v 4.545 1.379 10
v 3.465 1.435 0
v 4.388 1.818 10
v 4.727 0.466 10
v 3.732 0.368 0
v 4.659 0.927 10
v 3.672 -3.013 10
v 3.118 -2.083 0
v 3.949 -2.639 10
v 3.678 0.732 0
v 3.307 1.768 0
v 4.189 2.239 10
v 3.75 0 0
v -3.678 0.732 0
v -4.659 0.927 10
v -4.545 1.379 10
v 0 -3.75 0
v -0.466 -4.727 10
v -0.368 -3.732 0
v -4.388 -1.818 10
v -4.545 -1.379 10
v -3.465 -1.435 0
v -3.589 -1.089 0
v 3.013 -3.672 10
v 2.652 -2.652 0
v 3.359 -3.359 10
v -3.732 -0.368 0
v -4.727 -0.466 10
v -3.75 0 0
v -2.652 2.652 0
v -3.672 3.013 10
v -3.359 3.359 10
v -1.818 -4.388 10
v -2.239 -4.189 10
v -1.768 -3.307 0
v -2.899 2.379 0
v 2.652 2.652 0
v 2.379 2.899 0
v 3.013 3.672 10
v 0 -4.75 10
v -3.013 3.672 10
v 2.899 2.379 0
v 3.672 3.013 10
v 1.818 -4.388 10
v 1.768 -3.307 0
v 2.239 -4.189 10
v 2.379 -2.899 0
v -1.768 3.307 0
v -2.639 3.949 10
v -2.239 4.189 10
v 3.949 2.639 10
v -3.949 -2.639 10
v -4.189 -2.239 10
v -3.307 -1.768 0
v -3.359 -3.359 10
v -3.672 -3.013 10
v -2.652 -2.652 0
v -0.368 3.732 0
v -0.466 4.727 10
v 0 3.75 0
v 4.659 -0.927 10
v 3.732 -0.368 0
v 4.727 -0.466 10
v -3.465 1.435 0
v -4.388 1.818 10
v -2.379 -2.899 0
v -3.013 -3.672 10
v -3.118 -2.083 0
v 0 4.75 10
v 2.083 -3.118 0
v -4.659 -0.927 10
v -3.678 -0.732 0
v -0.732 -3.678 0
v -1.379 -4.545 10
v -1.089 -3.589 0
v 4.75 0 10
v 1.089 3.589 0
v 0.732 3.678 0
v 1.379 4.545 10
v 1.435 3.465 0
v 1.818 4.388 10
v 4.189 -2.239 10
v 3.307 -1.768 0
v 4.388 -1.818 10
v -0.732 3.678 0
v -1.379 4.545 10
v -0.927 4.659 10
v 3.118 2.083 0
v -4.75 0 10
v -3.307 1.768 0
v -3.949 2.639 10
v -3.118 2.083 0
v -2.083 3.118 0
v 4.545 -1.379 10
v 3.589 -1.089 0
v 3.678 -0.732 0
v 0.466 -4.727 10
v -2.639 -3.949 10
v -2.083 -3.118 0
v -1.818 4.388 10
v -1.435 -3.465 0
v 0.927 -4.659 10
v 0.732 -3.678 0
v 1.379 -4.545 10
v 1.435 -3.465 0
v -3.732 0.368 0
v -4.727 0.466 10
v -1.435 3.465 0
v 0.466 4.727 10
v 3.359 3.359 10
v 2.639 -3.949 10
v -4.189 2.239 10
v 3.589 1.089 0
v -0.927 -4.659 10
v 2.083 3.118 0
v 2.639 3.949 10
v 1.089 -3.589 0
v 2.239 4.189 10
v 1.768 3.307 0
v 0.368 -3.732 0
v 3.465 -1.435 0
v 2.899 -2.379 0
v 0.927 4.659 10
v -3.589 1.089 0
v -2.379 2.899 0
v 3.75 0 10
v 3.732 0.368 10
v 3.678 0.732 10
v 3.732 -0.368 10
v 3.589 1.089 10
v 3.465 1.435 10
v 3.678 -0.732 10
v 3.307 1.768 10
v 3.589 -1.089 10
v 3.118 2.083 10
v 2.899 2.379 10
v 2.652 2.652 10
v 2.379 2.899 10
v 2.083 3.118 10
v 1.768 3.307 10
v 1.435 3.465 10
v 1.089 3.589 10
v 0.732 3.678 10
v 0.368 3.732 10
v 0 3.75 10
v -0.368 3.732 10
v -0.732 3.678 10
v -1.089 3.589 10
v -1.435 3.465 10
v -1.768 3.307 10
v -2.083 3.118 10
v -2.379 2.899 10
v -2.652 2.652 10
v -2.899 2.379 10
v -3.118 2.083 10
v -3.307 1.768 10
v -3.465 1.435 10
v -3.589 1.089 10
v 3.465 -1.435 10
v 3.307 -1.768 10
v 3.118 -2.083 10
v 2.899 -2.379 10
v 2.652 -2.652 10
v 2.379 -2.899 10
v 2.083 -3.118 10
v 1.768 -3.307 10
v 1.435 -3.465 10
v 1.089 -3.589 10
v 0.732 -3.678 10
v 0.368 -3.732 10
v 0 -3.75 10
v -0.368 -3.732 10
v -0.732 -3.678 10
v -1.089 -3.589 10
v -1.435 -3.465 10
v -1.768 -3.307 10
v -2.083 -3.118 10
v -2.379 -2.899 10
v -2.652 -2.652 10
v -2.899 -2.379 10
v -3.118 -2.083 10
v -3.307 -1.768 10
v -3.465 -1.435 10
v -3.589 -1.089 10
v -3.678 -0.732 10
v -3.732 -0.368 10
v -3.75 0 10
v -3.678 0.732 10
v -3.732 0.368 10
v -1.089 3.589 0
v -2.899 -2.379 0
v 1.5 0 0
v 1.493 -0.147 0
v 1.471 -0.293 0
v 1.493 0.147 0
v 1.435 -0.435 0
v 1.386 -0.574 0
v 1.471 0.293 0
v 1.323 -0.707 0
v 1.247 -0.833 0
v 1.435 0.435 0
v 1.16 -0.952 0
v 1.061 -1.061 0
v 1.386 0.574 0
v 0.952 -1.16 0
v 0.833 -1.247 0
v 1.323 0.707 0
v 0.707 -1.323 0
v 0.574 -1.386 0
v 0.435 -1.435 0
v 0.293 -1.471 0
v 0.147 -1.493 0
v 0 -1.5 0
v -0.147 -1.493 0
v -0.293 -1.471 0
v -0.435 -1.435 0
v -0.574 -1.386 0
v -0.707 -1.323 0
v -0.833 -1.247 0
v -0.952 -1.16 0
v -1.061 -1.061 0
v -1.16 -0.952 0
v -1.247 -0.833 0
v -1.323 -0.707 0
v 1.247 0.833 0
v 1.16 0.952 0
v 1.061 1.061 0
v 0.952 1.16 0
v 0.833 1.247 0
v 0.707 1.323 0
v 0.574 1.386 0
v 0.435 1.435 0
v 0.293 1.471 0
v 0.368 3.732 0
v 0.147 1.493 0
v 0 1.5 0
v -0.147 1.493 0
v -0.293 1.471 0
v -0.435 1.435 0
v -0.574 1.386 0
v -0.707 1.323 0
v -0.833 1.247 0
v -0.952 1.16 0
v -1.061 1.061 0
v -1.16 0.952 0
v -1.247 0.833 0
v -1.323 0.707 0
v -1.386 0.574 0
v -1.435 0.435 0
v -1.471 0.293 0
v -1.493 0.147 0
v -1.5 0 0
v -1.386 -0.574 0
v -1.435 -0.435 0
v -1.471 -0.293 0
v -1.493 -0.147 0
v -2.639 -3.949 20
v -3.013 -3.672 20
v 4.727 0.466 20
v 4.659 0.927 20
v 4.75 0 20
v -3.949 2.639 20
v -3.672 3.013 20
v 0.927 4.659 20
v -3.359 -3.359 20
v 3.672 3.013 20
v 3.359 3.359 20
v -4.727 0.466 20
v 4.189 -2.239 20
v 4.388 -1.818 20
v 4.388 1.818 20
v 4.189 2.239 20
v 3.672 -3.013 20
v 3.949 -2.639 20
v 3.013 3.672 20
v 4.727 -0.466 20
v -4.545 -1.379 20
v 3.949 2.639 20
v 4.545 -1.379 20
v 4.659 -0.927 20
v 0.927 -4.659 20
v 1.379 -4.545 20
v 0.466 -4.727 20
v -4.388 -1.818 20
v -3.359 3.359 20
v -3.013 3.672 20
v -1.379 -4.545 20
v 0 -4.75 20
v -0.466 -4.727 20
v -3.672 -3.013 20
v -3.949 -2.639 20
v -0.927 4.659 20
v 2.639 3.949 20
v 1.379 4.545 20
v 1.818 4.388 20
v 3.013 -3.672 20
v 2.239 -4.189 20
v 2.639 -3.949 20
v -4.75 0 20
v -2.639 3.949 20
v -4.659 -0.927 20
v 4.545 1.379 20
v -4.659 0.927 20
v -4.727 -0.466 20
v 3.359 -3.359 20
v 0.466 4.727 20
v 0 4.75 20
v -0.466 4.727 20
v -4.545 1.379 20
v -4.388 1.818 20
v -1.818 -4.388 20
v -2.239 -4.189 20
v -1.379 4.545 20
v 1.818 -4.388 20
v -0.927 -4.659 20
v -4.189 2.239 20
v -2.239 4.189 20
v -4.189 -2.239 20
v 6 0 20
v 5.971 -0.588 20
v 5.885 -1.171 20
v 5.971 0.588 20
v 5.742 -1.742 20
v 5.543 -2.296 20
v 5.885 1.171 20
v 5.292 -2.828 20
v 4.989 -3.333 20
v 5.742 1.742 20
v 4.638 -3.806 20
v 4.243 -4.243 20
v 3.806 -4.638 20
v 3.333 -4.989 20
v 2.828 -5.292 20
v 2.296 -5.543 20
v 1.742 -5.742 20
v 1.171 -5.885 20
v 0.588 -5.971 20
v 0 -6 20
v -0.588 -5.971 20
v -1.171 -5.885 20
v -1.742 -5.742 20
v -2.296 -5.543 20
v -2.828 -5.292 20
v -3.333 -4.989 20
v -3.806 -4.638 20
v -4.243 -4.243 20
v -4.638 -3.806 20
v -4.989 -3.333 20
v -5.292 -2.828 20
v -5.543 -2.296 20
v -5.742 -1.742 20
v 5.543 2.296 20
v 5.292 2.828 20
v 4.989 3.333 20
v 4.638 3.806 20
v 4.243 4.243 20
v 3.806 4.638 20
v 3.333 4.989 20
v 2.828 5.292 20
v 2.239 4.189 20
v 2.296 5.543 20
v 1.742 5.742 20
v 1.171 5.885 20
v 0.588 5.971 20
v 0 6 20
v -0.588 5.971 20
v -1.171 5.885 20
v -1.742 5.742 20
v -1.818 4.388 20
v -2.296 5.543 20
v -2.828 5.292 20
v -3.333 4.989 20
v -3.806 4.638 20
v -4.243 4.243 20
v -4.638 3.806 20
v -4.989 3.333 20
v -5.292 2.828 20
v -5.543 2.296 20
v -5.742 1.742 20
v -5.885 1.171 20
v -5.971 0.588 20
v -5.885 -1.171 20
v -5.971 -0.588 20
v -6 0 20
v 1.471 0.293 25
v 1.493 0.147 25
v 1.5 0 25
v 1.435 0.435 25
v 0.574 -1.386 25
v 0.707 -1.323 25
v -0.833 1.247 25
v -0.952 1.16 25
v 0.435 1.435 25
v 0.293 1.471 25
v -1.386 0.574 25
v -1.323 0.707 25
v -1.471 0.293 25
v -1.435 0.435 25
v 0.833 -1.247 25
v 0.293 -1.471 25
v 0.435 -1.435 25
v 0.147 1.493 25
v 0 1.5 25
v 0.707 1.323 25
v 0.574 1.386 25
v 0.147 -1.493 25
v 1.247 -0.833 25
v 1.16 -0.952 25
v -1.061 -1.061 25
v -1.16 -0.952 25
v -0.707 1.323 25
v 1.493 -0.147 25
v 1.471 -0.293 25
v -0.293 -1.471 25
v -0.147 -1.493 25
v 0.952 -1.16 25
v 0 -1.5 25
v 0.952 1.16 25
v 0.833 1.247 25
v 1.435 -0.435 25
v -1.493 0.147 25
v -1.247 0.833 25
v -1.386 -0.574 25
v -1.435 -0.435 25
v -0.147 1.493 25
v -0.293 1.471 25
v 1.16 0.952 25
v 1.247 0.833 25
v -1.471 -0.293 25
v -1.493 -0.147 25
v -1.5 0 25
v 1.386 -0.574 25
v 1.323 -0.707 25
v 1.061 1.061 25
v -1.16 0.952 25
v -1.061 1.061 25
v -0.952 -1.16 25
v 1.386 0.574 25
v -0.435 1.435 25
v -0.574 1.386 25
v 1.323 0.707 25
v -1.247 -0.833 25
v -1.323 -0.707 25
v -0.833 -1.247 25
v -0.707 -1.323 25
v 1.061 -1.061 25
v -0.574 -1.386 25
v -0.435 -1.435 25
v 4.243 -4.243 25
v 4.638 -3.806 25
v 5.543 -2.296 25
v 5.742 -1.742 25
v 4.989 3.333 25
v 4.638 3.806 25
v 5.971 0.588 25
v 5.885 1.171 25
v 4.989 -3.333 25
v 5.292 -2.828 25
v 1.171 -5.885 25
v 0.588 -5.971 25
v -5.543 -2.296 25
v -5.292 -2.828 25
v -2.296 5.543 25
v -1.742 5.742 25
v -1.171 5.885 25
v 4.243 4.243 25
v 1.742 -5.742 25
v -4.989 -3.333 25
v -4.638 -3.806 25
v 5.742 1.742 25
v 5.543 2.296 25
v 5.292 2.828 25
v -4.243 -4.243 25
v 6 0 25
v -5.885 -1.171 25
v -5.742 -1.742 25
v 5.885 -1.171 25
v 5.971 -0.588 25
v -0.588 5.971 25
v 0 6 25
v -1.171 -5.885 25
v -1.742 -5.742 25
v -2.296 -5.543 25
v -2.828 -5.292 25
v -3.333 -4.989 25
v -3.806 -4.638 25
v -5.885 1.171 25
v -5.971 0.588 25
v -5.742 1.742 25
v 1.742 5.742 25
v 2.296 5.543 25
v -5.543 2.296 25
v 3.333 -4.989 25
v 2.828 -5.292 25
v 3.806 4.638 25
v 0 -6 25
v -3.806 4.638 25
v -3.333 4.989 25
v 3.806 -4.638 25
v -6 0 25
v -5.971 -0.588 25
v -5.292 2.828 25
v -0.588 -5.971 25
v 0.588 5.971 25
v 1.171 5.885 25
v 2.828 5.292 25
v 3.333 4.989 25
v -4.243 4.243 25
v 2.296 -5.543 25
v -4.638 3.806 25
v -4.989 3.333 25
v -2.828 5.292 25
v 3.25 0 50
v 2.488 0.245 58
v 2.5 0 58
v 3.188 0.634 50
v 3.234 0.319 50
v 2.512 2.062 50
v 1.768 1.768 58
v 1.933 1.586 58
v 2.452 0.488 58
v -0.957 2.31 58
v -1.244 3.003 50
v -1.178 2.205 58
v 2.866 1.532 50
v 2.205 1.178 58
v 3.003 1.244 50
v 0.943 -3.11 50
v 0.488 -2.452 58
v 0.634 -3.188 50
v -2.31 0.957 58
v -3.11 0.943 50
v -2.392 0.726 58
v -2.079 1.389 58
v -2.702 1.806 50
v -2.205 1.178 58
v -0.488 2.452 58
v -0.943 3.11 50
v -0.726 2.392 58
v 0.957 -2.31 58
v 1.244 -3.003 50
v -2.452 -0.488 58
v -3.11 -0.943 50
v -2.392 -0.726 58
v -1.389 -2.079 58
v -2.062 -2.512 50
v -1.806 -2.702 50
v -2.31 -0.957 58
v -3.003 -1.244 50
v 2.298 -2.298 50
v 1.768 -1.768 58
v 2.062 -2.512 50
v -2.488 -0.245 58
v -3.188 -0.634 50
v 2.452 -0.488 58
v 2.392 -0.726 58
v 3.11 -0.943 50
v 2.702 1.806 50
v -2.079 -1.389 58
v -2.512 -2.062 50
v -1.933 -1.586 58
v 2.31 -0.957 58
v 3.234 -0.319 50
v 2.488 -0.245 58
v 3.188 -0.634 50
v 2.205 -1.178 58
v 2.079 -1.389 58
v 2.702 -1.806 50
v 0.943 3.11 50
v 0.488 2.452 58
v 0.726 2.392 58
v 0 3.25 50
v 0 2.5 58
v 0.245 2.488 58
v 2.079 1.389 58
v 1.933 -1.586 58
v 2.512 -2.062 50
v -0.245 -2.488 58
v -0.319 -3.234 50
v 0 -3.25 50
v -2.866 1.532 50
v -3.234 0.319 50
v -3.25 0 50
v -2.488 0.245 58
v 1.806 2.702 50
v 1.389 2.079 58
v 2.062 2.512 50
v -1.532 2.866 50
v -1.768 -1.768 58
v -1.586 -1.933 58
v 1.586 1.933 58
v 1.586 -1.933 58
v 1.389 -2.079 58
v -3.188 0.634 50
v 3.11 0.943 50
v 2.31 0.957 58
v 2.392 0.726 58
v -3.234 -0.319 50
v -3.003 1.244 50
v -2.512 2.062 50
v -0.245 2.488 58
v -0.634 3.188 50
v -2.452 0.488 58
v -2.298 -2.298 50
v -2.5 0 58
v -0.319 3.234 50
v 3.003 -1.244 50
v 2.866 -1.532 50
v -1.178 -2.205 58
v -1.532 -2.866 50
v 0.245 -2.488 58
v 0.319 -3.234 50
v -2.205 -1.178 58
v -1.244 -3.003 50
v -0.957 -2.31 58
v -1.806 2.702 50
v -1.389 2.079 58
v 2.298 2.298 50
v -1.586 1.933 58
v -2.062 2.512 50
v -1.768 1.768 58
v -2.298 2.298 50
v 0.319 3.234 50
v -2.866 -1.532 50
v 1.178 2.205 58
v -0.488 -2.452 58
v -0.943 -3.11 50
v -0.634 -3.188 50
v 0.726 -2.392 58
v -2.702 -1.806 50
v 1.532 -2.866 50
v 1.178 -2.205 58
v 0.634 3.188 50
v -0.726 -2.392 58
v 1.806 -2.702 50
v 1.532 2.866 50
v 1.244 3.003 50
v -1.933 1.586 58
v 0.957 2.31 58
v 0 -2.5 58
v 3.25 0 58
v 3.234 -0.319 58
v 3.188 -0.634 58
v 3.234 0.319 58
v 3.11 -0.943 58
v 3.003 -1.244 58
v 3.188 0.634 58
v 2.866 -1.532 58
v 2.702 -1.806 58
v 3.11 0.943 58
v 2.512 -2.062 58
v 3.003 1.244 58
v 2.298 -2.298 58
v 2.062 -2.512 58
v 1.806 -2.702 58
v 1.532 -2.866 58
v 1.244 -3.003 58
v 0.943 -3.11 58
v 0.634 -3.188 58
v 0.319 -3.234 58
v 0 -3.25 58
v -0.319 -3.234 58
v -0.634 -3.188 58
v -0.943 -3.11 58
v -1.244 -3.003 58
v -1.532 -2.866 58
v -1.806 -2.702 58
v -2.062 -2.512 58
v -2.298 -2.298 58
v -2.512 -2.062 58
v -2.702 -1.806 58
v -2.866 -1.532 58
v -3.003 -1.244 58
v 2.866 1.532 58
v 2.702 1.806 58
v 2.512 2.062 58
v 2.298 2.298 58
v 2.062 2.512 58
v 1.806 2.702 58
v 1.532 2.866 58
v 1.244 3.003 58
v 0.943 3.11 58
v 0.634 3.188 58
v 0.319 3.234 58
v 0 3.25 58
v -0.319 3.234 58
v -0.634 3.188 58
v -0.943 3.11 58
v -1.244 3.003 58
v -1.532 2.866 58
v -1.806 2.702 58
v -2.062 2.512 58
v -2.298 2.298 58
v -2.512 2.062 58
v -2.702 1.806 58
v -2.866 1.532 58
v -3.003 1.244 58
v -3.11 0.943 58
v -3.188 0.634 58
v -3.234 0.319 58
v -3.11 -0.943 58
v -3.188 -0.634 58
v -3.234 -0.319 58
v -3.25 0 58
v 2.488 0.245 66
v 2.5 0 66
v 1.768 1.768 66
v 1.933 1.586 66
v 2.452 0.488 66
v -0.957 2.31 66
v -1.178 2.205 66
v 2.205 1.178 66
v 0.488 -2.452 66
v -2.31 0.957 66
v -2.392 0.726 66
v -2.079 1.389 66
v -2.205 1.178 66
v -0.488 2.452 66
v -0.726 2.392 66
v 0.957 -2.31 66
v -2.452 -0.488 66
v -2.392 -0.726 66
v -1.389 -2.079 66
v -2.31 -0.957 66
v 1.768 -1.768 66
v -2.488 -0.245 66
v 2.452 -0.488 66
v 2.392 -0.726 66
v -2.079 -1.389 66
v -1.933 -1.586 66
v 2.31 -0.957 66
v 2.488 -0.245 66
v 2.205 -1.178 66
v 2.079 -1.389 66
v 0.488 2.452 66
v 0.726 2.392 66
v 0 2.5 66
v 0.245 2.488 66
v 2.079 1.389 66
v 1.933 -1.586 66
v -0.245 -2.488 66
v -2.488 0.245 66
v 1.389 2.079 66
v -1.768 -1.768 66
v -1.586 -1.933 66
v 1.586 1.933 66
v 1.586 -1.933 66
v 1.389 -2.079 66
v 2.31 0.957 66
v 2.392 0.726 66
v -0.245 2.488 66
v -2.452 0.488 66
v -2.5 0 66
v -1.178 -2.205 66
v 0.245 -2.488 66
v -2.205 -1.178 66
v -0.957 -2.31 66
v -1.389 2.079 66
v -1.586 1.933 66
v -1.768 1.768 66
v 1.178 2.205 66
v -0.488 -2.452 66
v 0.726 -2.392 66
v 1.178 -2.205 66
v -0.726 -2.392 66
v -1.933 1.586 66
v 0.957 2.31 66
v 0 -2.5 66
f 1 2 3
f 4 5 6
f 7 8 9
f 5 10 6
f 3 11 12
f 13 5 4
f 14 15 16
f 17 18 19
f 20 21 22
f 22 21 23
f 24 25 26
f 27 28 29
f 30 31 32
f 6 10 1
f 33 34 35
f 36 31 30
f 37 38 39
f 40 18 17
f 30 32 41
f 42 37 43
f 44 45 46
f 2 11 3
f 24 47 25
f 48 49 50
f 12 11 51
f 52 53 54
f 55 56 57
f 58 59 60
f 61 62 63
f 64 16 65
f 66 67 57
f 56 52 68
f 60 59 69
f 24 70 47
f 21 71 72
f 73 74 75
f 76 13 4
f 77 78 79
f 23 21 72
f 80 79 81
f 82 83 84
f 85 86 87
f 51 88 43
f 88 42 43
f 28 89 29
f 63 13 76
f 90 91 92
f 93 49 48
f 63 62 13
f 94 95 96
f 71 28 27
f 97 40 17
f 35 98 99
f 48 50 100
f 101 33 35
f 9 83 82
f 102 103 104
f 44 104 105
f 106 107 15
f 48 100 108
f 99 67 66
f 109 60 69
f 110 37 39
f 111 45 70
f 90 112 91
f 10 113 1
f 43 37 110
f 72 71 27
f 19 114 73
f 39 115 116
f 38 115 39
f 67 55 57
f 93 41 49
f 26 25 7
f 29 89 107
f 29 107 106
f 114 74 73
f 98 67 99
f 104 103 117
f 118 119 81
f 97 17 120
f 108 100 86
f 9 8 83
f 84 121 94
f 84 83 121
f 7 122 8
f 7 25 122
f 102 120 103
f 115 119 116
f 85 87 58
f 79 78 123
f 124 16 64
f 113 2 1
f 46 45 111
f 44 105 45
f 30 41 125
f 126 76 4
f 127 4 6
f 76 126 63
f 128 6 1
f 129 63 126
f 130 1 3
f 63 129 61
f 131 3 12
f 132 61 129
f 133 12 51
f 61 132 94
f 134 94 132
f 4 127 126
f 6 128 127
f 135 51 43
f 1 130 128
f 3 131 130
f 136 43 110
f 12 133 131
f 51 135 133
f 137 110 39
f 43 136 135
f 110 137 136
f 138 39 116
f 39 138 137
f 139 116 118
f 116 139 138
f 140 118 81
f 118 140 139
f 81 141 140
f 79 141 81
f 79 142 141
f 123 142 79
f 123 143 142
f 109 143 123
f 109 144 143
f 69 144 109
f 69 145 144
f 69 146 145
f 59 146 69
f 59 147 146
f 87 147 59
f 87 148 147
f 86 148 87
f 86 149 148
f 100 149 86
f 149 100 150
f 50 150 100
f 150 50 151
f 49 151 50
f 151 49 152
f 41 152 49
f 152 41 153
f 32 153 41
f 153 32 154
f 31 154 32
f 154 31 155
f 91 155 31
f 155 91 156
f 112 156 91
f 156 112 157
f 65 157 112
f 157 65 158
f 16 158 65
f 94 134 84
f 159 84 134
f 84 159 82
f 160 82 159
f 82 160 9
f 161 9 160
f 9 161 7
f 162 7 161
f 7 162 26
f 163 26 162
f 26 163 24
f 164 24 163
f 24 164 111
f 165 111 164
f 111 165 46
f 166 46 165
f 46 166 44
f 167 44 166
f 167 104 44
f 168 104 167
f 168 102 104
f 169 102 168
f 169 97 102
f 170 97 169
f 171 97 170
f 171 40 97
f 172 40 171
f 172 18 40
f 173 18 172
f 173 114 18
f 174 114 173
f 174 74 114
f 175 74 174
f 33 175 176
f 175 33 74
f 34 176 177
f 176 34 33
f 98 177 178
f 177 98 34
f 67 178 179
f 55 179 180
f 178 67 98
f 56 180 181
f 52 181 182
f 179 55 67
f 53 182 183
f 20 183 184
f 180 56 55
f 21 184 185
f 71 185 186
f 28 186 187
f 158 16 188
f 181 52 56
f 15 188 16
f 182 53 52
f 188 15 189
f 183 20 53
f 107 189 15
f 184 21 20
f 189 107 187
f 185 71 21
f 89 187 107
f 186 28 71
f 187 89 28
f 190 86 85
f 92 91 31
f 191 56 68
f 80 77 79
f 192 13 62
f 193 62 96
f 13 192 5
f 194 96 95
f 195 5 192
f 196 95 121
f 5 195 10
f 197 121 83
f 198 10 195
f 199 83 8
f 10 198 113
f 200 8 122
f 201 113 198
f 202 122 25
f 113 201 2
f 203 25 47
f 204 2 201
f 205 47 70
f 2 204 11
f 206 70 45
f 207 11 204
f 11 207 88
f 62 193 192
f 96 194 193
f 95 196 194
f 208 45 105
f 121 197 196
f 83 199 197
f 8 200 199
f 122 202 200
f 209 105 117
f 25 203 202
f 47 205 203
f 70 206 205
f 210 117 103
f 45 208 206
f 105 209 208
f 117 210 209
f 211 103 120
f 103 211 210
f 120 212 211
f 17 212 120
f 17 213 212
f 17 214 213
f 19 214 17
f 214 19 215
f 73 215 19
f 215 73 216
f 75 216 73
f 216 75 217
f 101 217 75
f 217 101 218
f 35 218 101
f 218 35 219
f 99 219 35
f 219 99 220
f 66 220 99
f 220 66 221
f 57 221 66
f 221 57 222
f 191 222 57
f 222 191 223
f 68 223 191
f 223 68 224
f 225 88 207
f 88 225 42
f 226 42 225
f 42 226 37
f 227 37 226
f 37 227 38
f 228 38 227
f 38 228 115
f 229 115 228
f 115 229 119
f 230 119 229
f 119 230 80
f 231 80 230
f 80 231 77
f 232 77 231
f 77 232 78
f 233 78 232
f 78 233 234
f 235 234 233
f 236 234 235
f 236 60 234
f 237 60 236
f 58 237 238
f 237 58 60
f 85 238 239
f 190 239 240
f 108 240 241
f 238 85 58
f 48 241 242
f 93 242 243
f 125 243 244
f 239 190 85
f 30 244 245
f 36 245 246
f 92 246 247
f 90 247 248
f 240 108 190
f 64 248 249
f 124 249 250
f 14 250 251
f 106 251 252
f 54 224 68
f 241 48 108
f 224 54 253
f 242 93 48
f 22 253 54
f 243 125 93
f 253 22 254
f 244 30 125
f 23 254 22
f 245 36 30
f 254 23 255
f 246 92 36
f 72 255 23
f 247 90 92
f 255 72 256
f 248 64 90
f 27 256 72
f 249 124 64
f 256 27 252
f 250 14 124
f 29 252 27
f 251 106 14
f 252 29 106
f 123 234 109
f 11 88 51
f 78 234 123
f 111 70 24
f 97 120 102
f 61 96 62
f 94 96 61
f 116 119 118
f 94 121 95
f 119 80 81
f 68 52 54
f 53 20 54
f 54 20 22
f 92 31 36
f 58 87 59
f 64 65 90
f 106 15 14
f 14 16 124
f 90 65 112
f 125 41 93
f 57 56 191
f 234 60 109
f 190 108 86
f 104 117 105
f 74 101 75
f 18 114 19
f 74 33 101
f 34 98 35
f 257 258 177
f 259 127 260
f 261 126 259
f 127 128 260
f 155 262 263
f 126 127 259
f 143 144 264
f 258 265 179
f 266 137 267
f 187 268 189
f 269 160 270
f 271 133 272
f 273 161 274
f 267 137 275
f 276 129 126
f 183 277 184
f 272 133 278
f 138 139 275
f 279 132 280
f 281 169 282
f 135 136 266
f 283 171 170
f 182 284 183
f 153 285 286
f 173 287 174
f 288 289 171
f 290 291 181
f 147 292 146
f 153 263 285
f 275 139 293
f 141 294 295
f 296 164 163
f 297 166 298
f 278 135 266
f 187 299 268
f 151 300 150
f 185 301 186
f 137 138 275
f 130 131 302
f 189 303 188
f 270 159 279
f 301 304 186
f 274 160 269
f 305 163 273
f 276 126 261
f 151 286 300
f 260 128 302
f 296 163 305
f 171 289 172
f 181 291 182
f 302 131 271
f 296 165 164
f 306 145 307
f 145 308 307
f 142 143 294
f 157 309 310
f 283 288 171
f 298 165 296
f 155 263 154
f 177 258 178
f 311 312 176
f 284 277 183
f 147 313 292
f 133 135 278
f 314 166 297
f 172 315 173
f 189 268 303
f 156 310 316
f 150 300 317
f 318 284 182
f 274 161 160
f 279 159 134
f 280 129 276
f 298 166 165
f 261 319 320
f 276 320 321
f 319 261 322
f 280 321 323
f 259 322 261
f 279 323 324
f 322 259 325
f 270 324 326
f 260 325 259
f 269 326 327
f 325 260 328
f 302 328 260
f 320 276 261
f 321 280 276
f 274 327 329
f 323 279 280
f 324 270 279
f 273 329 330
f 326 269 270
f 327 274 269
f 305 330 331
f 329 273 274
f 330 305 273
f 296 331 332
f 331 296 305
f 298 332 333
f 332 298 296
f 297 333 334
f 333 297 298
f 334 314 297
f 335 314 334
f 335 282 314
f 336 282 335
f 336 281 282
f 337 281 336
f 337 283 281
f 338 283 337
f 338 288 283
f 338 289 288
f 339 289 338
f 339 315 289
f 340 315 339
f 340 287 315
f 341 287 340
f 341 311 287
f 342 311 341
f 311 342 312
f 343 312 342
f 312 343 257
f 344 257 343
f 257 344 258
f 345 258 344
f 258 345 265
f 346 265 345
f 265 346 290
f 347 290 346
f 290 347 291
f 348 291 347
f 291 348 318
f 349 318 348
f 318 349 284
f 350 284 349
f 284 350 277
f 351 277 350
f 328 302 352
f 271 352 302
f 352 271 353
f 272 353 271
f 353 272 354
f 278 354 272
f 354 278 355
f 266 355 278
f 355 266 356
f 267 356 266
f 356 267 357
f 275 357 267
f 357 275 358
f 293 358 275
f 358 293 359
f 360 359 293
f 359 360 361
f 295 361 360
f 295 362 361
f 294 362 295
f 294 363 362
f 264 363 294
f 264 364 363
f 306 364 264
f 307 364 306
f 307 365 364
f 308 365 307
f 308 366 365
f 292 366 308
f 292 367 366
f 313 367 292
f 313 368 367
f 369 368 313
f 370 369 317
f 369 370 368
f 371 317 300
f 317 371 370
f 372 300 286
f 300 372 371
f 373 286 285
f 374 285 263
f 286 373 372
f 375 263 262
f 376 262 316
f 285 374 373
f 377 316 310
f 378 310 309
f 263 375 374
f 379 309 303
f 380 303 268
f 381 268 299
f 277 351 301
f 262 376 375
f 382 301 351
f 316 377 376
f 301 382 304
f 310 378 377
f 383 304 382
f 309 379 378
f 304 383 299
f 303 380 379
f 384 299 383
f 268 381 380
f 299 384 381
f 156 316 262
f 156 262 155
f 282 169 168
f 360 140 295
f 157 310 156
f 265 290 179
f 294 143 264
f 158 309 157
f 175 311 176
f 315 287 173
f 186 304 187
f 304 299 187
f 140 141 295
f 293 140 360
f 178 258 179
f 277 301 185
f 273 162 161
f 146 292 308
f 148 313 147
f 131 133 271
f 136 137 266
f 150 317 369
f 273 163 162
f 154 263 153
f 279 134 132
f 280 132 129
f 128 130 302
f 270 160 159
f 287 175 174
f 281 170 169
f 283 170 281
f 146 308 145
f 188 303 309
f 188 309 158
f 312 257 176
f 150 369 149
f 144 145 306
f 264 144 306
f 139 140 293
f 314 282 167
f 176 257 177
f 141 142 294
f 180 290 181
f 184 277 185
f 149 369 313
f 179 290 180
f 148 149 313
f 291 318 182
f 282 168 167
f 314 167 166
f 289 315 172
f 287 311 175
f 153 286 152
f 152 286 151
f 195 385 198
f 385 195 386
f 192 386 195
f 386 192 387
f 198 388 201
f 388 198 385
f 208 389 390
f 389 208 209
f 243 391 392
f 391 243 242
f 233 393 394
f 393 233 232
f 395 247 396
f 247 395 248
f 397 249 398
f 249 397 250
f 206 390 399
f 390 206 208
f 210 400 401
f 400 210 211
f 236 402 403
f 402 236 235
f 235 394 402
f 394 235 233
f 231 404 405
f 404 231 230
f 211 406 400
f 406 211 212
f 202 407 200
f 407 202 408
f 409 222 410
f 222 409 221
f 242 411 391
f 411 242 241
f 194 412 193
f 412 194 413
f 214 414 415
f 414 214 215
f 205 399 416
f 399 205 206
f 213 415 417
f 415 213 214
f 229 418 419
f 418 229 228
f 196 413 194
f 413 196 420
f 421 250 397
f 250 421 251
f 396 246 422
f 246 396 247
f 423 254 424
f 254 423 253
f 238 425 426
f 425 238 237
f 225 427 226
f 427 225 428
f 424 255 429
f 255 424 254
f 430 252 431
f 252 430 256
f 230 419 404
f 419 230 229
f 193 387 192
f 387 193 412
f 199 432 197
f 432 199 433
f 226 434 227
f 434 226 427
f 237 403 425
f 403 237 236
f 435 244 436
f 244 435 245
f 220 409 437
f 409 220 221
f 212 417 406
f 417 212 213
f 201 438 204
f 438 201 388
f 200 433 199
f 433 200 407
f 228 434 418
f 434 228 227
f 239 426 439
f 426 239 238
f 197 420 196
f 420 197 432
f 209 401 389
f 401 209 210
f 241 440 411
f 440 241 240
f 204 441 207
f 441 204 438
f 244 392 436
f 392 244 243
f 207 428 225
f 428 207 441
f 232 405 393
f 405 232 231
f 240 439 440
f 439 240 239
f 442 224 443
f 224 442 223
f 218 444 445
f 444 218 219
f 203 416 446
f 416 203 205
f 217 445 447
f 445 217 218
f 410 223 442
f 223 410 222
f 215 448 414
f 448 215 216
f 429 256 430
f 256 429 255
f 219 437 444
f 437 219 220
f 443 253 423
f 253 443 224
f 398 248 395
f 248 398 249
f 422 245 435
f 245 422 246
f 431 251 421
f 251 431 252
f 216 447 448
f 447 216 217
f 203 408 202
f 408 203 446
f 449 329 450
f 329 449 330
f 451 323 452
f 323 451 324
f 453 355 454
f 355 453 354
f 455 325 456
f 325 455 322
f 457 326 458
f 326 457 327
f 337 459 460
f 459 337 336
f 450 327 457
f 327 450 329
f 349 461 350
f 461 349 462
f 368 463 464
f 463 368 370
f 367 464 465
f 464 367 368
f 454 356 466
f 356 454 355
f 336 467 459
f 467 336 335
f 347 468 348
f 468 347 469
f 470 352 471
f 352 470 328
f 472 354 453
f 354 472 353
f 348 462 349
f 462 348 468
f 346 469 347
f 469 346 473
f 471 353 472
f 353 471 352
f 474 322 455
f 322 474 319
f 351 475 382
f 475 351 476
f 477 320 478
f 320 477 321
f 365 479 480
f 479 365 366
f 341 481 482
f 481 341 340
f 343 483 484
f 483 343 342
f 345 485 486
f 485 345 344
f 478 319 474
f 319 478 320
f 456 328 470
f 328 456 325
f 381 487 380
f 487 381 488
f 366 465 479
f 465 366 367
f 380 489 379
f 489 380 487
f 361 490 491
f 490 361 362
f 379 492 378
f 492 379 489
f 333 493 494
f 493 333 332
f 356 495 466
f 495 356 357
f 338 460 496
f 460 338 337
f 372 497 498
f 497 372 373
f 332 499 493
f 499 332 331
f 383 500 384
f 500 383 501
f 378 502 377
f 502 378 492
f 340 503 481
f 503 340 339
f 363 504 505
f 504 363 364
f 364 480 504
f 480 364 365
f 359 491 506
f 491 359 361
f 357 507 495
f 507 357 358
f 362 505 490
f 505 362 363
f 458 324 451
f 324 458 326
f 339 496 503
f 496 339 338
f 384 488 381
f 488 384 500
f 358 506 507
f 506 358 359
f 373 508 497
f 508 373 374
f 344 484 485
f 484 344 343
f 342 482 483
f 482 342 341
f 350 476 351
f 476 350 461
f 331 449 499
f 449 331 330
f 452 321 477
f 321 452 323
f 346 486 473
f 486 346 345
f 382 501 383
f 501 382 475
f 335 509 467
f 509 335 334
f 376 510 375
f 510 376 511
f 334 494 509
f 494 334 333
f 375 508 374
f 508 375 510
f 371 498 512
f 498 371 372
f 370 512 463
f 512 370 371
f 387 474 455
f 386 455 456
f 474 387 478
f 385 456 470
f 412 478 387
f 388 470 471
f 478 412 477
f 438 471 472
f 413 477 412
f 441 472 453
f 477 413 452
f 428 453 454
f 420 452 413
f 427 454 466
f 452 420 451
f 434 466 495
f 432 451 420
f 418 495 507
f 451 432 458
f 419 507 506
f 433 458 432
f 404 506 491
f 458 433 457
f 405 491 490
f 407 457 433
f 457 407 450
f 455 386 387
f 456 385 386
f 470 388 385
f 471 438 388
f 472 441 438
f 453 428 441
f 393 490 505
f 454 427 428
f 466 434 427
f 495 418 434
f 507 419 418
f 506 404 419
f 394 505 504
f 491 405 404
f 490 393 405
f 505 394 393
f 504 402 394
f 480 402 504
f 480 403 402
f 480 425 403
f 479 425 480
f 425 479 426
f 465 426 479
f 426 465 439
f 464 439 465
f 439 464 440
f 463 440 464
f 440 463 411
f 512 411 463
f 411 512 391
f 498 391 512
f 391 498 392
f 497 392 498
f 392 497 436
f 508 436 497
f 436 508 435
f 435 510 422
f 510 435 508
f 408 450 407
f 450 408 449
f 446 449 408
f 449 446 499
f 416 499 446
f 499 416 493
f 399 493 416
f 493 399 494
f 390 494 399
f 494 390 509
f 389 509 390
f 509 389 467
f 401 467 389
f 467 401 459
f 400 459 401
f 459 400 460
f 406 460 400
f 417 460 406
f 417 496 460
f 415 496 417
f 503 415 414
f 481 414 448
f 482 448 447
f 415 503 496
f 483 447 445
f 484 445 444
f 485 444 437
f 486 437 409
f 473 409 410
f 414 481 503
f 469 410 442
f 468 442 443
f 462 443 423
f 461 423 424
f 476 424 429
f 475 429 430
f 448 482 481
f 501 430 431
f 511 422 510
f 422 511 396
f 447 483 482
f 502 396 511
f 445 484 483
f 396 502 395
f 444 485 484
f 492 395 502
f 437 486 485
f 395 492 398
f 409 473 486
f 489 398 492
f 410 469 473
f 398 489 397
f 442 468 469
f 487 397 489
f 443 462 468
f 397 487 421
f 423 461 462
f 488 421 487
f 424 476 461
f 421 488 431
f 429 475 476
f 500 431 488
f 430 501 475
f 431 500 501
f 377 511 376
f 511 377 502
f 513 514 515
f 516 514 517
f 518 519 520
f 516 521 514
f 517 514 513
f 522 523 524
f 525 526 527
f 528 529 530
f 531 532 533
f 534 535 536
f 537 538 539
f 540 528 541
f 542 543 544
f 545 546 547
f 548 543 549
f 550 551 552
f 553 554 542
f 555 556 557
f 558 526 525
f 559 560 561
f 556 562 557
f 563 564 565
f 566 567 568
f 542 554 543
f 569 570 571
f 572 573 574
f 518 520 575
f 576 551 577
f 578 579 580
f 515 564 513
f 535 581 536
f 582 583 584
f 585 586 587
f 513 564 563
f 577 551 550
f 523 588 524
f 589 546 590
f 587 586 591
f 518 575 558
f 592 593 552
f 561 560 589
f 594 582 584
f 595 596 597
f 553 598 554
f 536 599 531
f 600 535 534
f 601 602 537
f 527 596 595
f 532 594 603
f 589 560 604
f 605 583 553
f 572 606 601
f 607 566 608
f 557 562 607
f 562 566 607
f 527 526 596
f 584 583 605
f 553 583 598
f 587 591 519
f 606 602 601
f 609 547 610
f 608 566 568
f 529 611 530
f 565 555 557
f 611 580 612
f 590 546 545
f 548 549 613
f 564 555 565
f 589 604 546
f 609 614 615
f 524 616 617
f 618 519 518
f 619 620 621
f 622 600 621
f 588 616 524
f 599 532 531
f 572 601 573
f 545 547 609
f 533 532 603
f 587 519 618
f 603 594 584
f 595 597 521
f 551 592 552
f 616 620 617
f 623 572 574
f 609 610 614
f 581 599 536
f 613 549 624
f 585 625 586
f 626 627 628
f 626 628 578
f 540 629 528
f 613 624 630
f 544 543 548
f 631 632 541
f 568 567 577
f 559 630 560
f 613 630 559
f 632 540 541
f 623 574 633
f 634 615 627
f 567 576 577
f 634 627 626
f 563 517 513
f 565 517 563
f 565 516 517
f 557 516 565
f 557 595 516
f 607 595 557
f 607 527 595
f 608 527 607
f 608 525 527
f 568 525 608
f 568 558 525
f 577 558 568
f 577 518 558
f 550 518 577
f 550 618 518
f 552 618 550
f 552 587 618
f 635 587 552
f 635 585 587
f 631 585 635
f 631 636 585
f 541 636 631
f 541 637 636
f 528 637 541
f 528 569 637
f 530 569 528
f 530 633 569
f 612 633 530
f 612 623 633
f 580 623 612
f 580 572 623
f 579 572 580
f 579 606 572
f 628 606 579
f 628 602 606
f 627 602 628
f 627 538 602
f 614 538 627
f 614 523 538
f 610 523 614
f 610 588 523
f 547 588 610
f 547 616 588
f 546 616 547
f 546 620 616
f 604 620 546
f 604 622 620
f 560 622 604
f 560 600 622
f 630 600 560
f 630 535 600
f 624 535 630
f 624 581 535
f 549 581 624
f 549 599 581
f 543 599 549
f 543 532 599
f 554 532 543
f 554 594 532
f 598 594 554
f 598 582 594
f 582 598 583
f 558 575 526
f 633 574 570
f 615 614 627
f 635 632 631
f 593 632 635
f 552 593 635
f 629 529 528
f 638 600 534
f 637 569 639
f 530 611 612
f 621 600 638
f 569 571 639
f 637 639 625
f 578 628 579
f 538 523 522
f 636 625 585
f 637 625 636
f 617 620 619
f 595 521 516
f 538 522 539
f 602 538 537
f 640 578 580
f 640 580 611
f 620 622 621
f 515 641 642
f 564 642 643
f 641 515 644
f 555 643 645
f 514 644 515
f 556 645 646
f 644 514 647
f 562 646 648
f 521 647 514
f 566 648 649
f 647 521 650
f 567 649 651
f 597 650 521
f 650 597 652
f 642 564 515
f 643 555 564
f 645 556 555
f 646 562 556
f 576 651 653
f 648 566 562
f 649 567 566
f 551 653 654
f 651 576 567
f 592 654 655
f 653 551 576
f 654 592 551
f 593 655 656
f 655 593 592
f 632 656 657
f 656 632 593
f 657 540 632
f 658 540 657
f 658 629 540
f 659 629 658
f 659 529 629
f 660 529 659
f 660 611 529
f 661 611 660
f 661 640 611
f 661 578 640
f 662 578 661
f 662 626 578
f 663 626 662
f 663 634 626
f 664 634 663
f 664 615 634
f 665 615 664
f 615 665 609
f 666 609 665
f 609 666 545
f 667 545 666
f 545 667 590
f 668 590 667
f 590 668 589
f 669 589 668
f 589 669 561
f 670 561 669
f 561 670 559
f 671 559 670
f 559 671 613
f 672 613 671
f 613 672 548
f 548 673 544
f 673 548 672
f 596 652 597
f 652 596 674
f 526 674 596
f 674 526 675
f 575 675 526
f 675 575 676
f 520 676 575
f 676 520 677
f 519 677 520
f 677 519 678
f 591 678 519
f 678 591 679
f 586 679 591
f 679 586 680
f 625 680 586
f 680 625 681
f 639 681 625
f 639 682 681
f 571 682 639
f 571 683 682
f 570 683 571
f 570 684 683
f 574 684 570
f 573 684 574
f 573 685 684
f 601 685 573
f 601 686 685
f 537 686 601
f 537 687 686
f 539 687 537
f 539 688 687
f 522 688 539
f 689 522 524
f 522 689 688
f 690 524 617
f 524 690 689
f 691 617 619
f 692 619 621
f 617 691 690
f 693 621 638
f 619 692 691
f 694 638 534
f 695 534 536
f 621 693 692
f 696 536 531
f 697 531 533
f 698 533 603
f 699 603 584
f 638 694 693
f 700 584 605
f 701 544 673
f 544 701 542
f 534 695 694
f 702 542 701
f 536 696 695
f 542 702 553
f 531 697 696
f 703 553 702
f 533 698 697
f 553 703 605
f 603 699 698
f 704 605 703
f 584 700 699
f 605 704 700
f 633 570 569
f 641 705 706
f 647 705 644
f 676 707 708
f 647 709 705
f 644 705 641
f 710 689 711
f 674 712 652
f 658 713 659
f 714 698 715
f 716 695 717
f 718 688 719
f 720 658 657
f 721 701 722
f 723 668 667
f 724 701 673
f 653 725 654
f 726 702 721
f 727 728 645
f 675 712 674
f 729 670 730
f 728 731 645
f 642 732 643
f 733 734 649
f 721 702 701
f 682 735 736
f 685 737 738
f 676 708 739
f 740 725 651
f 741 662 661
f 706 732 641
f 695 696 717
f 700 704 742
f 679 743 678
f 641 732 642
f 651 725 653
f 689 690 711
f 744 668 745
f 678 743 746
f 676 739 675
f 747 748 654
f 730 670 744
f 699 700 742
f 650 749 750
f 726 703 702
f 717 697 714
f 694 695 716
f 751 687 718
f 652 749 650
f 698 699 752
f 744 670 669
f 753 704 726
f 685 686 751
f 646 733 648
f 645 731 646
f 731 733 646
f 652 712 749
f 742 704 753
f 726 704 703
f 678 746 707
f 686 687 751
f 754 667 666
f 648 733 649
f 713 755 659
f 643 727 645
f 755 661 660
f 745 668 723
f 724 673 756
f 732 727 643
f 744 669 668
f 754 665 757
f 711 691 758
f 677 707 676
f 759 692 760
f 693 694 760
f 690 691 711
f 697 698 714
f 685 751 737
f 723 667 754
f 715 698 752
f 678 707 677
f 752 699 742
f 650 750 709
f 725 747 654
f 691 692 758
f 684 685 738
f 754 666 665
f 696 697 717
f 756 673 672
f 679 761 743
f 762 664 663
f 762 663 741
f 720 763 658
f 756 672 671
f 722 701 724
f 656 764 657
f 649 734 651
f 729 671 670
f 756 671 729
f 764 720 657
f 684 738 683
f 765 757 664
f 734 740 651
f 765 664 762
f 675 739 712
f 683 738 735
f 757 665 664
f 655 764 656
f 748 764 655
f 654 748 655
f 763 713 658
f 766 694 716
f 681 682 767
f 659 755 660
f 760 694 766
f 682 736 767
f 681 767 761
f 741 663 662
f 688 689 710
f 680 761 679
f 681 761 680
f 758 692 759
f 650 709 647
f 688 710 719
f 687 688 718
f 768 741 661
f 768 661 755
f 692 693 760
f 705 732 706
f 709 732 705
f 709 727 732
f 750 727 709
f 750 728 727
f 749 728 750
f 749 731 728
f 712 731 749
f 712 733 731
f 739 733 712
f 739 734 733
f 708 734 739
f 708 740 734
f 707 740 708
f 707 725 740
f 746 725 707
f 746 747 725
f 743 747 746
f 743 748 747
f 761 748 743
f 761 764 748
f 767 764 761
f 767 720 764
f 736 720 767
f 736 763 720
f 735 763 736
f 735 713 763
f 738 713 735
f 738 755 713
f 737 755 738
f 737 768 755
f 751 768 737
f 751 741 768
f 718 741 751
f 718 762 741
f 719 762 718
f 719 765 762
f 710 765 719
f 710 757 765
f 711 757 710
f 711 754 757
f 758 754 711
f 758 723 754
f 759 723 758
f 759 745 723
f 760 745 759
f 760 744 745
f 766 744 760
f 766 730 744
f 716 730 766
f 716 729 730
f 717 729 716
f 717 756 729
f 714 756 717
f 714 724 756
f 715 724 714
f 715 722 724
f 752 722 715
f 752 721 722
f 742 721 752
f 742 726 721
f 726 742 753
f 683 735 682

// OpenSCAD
// Hose-barb reducer for 8mm to 5mm silicone tubing
// Print orientation: upright along Z axis

// Parameters
bore_diameter = 3;              // Internal bore diameter (mm)
collar_diameter = 12;           // Collar outer diameter (mm)
collar_height = 5;              // Collar height (mm) - from z=20 to z=25

// 8 mm side barb parameters (2 barbs, each 10mm tall)
barb8_height = 10;              // Height of each 8mm barb (mm)
barb8_bottom_diameter = 7.5;    // Bottom diameter of 8mm barb (mm)
barb8_top_diameter = 9.5;       // Top diameter of 8mm barb (mm)
num_barb8 = 2;                  // Number of 8mm barbs

// 5 mm side barb parameters (2 barbs, each 8mm tall)
barb5_height = 8;               // Height of each 5mm barb (mm)
barb5_bottom_diameter = 6.5;    // Bottom diameter of 5mm barb (mm)
barb5_top_diameter = 5.0;       // Top diameter of 5mm barb (mm)
num_barb5 = 2;                  // Number of 5mm barbs

// Total heights
z8_start = 0;
z8_end = z8_start + num_barb8 * barb8_height;  // 20
z_collar_start = z8_end;                        // 20
z_collar_end = z_collar_start + collar_height; // 25
z5_start = z_collar_end;                        // 25
z5_end = z5_start + num_barb5 * barb5_height;  // 41

// Resolution
$fn = 64;

module barb_section(start_z, height, bottom_d, top_d, num_barbs) {
    total_height = num_barbs * height;
    
    // Base cylinder with bore
    difference() {
        // Outer shape (cylinder with varying diameter)
        union() {
            for (i = [0 : num_barbs - 1]) {
                z_barb_start = start_z + i * height;
                // Linear interpolation for diameter at each height
                translate([0, 0, z_barb_start]) {
                    linear_extrude(height = height, scale = top_d / bottom_d) {
                        circle(d = bottom_d);
                    }
                }
            }
        }
        
        // Bore through entire section
        translate([0, 0, -0.01]) {
            cylinder(h = total_height + 0.02, d = bore_diameter);
        }
    }
}

module collar_section(z_start, z_end, outer_d, inner_d) {
    total_height = z_end - z_start;
    difference() {
        cylinder(h = total_height, d = outer_d);
        translate([0, 0, -0.01]) {
            cylinder(h = total_height + 0.02, d = inner_d);
        }
    }
}

// Build the complete reducer
module reducer() {
    // 8 mm barbs section (z = 0 to 20)
    barb_section(z8_start, barb8_height, barb8_bottom_diameter, barb8_top_diameter, num_barb8);
    
    // Collar section (z = 20 to 25)
    translate([0, 0, z_collar_start]) {
        collar_section(z_collar_start, z_collar_end, collar_diameter, bore_diameter);
    }
    
    // 5 mm barbs section (z = 25 to 41)
    translate([0, 0, z5_start]) {
        barb_section(z5_start, barb5_height, barb5_bottom_diameter, barb5_top_diameter, num_barb5);
    }
}

// Render the reducer
reducer();
